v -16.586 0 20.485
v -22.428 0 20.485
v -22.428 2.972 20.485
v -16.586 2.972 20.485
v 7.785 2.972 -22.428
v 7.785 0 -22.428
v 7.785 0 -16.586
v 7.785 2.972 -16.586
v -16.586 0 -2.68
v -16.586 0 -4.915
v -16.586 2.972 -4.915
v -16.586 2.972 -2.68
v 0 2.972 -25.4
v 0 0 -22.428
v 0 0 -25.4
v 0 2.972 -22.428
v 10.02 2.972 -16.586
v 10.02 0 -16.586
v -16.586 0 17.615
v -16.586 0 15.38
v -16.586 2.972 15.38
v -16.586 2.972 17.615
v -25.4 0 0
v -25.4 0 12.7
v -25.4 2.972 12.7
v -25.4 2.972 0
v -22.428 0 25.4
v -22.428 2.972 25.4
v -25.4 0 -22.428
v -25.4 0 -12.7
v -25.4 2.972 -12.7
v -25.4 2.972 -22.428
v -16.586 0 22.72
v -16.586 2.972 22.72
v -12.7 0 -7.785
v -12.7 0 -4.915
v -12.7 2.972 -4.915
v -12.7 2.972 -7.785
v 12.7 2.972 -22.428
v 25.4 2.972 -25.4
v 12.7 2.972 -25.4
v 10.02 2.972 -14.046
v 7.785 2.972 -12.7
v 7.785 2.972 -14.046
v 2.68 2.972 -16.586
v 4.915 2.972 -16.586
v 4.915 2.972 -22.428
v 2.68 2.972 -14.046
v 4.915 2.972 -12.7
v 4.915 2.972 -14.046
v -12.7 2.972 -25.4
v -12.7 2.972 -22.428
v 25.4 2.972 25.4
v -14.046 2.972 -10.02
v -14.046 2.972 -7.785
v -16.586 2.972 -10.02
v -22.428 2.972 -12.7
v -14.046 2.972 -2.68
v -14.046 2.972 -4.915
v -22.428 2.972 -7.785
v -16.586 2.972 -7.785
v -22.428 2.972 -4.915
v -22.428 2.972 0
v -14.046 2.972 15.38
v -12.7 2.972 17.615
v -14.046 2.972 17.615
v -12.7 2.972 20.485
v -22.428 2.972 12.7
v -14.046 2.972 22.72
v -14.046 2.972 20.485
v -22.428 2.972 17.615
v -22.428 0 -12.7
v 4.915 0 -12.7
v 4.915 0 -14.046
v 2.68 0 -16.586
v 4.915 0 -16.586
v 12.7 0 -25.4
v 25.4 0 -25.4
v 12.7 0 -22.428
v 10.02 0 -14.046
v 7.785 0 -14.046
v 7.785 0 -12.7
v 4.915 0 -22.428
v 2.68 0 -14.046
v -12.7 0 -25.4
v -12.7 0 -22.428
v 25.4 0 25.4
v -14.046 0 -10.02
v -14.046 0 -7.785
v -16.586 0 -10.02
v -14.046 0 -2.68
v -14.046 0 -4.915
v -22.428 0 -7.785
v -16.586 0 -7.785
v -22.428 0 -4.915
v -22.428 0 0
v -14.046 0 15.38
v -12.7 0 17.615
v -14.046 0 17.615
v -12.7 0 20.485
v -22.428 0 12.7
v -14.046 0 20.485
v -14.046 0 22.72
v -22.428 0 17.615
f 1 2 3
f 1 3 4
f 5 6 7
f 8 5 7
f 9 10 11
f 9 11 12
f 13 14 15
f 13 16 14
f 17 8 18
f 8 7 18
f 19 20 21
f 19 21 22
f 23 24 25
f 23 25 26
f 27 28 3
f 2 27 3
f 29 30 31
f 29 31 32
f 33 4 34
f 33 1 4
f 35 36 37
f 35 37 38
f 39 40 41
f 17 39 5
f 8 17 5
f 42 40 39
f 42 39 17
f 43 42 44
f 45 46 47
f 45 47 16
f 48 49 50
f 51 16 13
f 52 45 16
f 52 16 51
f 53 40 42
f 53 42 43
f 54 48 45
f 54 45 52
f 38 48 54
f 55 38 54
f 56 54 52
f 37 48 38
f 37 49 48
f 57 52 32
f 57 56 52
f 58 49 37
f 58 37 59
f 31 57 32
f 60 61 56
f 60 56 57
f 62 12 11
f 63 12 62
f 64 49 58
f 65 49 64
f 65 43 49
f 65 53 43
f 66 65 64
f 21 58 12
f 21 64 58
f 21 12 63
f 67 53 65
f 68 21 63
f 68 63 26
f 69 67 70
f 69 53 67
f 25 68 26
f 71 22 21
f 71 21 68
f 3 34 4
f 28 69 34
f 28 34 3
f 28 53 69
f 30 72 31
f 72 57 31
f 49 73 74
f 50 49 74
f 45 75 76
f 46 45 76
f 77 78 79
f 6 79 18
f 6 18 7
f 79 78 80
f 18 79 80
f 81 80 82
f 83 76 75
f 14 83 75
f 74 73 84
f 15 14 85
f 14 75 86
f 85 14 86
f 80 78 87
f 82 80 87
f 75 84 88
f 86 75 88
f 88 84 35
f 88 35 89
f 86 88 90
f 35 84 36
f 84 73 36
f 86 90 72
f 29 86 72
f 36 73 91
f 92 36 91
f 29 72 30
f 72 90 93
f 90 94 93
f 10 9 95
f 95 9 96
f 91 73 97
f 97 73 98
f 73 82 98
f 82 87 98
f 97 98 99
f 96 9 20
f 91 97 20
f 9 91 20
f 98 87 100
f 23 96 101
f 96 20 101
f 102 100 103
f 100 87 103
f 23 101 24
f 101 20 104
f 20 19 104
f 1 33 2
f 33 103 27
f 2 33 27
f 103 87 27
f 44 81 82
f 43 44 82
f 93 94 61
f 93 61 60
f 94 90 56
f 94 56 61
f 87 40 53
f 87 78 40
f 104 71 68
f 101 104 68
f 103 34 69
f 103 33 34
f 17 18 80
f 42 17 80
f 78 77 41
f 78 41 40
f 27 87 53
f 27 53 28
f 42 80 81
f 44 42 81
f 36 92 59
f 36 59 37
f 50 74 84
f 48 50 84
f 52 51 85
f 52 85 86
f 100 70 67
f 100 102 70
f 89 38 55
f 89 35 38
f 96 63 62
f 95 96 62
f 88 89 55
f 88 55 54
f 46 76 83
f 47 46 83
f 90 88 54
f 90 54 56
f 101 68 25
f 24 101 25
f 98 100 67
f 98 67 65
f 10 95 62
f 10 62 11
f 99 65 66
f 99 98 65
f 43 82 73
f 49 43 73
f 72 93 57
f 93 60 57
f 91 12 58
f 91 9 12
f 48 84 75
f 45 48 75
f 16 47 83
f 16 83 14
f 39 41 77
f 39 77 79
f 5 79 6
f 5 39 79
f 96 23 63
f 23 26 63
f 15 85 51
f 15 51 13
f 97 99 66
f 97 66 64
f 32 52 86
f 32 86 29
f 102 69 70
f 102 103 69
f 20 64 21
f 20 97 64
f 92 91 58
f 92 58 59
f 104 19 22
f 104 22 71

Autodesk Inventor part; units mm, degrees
ref_plane "YZ Plane" through (0, 0, 0) normal (1, 0, 0) x (0, 1, 0)
ref_plane "XZ Plane" through (0, 0, 0) normal (0, 1, 0) x (-1, 0, 0)
ref_plane "XY Plane" through (0, 0, 0) normal (0, 0, 1) x (1, 0, 0)
sketch "Sketch1" plane through (0, 0, 0) normal (0, 1, 0) x (-1, 0, 0)
  line L0 (-25.4, 25.4) -> (25.4, 25.4)
  line L1 (25.4, 25.4) -> (25.4, -25.4)
  line L2 (25.4, -25.4) -> (-25.4, -25.4)
  line L3 (-25.4, -25.4) -> (-25.4, 25.4)
  line L4 (-25.4, 25.4) -> (25.4, -25.4) construction
  line L5 (25.4, 25.4) -> (-25.4, -25.4) construction
  point P0 (0, 0)
  dimension "d0" = 50.8
  dimension "d1" = 50.8
extrude "Extrusion1" add sketch "Sketch1" along normal blind 2.9718
sketch "Sketch2" plane through (0, 2.9718, 0) normal (0, 1, 0) x (1, 0, 0)
  line L0 (-25.4, -25.4) -> (25.4, -25.4) projected
  line L1 (-25.4, -25.4) -> (-22.4282, -25.4)
  line L2 (-22.4282, -25.4) -> (-22.4282, -12.7)
  line L3 (-22.4282, -12.7) -> (-25.4, -12.7)
  line L4 (-25.4, -12.7) -> (-25.4, -25.4)
  line L5 (-25.4, 25.4) -> (-25.4, -25.4) projected
  line L6 (-25.4, 0) -> (-22.4282, 0)
  line L7 (-22.4282, 0) -> (-22.4282, 12.7)
  line L8 (-22.4282, 12.7) -> (-25.4, 12.7)
  line L9 (-25.4, 12.7) -> (-25.4, 0)
  line L10 (-25.4, 25.4) -> (-12.7, 25.4)
  line L11 (-12.7, 25.4) -> (-12.7, 22.4282)
  line L12 (-12.7, 22.4282) -> (-25.4, 22.4282)
  line L13 (-25.4, 22.4282) -> (-25.4, 25.4)
  line L14 (25.4, 25.4) -> (-25.4, 25.4) projected
  line L15 (0, 25.4) -> (12.7, 25.4)
  line L16 (12.7, 25.4) -> (12.7, 22.4282)
  line L17 (12.7, 22.4282) -> (0, 22.4282)
  line L18 (0, 22.4282) -> (0, 25.4)
  point P0 (0, 0)
  dimension "d4" = 2.9718
  dimension "d5" = 12.7
  dimension "d6" = 2.9718
  dimension "d7" = 12.7
  dimension "d8" = 12.7
  dimension "d9" = 2.9718
  dimension "d10" = 12.7
  dimension "d11" = 2.9718
extrude "Extrusion2" cut sketch "Sketch2" against normal blind 2.9718
sketch "Sketch3" plane through (0, 0, 0) normal (0, -1, 0) x (1, 0, 0)
  line L0 (7.7851, -12.7) -> (4.9149, -12.7)
  line L1 (4.9149, -22.4282) -> (7.7851, -22.4282)
  line L2 (7.7851, -12.7) -> (4.9149, -22.4282) construction
  line L3 (4.9149, -12.7) -> (7.7851, -22.4282) construction
  line L4 (0, -22.4282) -> (12.7, -22.4282) projected
  line L5 (12.7, -22.4282) -> (12.7, -25.4) projected
  line L6 (2.6797, -14.0462) -> (2.6797, -16.5862)
  line L7 (10.0203, -16.5862) -> (10.0203, -14.0462)
  line L8 (10.0203, -14.0462) -> (2.6797, -16.5862) construction
  line L9 (2.6797, -14.0462) -> (10.0203, -16.5862) construction
  line L10 (2.6797, -16.5862) -> (4.9149, -16.5862)
  line L11 (4.9149, -12.7) -> (4.9149, -14.0462)
  line L12 (4.9149, -16.5862) -> (4.9149, -22.4282)
  line L13 (10.0203, -14.0462) -> (7.7851, -14.0462)
  line L14 (4.9149, -14.0462) -> (2.6797, -14.0462)
  line L15 (7.7851, -22.4282) -> (7.7851, -16.5862)
  line L16 (7.7851, -14.0462) -> (7.7851, -12.7)
  line L17 (7.7851, -16.5862) -> (10.0203, -16.5862)
  line L18 (-14.0462, -10.0203) -> (-16.5862, -10.0203)
  line L19 (-16.5862, -10.0203) -> (-16.5862, -7.7851)
  line L20 (-16.5862, -7.7851) -> (-22.4282, -7.7851)
  line L21 (-22.4282, -7.7851) -> (-22.4282, -4.9149)
  line L22 (-22.4282, -4.9149) -> (-16.5862, -4.9149)
  line L23 (-16.5862, -4.9149) -> (-16.5862, -2.6797)
  line L24 (-16.5862, -2.6797) -> (-14.0462, -2.6797)
  line L25 (-14.0462, -2.6797) -> (-14.0462, -4.9149)
  line L26 (-14.0462, -4.9149) -> (-12.7, -4.9149)
  line L27 (-12.7, -4.9149) -> (-12.7, -7.7851)
  line L28 (-12.7, -7.7851) -> (-14.0462, -7.7851)
  line L29 (-14.0462, -7.7851) -> (-14.0462, -10.0203)
  line L30 (-25.4, 0) -> (-22.4282, 0) projected
  line L31 (-22.4282, -12.7) -> (-22.4282, 0) projected
  line L32 (-14.0462, 17.6149) -> (-14.0462, 15.3797)
  line L33 (-12.7, 17.6149) -> (-14.0462, 17.6149)
  line L34 (-12.7, 20.4851) -> (-12.7, 17.6149)
  line L35 (-14.0462, 15.3797) -> (-16.5862, 15.3797)
  line L36 (-14.0462, 20.4851) -> (-12.7, 20.4851)
  line L37 (-14.0462, 22.7203) -> (-14.0462, 20.4851)
  line L38 (-16.5862, 22.7203) -> (-14.0462, 22.7203)
  line L39 (-16.5862, 15.3797) -> (-16.5862, 17.6149)
  line L40 (-16.5862, 20.4851) -> (-16.5862, 22.7203)
  line L41 (-22.4282, 20.4851) -> (-16.5862, 20.4851)
  line L42 (-16.5862, 17.6149) -> (-22.4282, 17.6149)
  line L43 (-22.4282, 17.6149) -> (-22.4282, 20.4851)
  point P0 (0, 0)
  point P1 (6.35, -17.5641)
  point P2 (6.35, -15.3162)
  dimension "d14" = 0
  dimension "d15" = 2.8702
  dimension "d16" = 6.35
  dimension "d17" = 9.7282
  dimension "d18" = 7.3406
  dimension "d19" = 0
  dimension "d20" = 2.54
  dimension "d22" = 5.842
  dimension "d23" = 2.2352
  dimension "d24" = 5.842
  dimension "d25" = 2.8702
  dimension "d26" = 1.3462
  dimension "d46" = 2.8702
  dimension "d47" = 5.842
  dimension "d48" = 2.2352
  dimension "d49" = 2.2352
  dimension "d50" = 1.3462
  dimension "d51" = 2.54
  dimension "d52" = 2.54
  dimension "d60" = 4.9149
  dimension "d61" = 0
  dimension "d64" = 25.4
extrude "Extrusion4" cut sketch "Sketch3" against normal blind 25.4
properties part number "base"
